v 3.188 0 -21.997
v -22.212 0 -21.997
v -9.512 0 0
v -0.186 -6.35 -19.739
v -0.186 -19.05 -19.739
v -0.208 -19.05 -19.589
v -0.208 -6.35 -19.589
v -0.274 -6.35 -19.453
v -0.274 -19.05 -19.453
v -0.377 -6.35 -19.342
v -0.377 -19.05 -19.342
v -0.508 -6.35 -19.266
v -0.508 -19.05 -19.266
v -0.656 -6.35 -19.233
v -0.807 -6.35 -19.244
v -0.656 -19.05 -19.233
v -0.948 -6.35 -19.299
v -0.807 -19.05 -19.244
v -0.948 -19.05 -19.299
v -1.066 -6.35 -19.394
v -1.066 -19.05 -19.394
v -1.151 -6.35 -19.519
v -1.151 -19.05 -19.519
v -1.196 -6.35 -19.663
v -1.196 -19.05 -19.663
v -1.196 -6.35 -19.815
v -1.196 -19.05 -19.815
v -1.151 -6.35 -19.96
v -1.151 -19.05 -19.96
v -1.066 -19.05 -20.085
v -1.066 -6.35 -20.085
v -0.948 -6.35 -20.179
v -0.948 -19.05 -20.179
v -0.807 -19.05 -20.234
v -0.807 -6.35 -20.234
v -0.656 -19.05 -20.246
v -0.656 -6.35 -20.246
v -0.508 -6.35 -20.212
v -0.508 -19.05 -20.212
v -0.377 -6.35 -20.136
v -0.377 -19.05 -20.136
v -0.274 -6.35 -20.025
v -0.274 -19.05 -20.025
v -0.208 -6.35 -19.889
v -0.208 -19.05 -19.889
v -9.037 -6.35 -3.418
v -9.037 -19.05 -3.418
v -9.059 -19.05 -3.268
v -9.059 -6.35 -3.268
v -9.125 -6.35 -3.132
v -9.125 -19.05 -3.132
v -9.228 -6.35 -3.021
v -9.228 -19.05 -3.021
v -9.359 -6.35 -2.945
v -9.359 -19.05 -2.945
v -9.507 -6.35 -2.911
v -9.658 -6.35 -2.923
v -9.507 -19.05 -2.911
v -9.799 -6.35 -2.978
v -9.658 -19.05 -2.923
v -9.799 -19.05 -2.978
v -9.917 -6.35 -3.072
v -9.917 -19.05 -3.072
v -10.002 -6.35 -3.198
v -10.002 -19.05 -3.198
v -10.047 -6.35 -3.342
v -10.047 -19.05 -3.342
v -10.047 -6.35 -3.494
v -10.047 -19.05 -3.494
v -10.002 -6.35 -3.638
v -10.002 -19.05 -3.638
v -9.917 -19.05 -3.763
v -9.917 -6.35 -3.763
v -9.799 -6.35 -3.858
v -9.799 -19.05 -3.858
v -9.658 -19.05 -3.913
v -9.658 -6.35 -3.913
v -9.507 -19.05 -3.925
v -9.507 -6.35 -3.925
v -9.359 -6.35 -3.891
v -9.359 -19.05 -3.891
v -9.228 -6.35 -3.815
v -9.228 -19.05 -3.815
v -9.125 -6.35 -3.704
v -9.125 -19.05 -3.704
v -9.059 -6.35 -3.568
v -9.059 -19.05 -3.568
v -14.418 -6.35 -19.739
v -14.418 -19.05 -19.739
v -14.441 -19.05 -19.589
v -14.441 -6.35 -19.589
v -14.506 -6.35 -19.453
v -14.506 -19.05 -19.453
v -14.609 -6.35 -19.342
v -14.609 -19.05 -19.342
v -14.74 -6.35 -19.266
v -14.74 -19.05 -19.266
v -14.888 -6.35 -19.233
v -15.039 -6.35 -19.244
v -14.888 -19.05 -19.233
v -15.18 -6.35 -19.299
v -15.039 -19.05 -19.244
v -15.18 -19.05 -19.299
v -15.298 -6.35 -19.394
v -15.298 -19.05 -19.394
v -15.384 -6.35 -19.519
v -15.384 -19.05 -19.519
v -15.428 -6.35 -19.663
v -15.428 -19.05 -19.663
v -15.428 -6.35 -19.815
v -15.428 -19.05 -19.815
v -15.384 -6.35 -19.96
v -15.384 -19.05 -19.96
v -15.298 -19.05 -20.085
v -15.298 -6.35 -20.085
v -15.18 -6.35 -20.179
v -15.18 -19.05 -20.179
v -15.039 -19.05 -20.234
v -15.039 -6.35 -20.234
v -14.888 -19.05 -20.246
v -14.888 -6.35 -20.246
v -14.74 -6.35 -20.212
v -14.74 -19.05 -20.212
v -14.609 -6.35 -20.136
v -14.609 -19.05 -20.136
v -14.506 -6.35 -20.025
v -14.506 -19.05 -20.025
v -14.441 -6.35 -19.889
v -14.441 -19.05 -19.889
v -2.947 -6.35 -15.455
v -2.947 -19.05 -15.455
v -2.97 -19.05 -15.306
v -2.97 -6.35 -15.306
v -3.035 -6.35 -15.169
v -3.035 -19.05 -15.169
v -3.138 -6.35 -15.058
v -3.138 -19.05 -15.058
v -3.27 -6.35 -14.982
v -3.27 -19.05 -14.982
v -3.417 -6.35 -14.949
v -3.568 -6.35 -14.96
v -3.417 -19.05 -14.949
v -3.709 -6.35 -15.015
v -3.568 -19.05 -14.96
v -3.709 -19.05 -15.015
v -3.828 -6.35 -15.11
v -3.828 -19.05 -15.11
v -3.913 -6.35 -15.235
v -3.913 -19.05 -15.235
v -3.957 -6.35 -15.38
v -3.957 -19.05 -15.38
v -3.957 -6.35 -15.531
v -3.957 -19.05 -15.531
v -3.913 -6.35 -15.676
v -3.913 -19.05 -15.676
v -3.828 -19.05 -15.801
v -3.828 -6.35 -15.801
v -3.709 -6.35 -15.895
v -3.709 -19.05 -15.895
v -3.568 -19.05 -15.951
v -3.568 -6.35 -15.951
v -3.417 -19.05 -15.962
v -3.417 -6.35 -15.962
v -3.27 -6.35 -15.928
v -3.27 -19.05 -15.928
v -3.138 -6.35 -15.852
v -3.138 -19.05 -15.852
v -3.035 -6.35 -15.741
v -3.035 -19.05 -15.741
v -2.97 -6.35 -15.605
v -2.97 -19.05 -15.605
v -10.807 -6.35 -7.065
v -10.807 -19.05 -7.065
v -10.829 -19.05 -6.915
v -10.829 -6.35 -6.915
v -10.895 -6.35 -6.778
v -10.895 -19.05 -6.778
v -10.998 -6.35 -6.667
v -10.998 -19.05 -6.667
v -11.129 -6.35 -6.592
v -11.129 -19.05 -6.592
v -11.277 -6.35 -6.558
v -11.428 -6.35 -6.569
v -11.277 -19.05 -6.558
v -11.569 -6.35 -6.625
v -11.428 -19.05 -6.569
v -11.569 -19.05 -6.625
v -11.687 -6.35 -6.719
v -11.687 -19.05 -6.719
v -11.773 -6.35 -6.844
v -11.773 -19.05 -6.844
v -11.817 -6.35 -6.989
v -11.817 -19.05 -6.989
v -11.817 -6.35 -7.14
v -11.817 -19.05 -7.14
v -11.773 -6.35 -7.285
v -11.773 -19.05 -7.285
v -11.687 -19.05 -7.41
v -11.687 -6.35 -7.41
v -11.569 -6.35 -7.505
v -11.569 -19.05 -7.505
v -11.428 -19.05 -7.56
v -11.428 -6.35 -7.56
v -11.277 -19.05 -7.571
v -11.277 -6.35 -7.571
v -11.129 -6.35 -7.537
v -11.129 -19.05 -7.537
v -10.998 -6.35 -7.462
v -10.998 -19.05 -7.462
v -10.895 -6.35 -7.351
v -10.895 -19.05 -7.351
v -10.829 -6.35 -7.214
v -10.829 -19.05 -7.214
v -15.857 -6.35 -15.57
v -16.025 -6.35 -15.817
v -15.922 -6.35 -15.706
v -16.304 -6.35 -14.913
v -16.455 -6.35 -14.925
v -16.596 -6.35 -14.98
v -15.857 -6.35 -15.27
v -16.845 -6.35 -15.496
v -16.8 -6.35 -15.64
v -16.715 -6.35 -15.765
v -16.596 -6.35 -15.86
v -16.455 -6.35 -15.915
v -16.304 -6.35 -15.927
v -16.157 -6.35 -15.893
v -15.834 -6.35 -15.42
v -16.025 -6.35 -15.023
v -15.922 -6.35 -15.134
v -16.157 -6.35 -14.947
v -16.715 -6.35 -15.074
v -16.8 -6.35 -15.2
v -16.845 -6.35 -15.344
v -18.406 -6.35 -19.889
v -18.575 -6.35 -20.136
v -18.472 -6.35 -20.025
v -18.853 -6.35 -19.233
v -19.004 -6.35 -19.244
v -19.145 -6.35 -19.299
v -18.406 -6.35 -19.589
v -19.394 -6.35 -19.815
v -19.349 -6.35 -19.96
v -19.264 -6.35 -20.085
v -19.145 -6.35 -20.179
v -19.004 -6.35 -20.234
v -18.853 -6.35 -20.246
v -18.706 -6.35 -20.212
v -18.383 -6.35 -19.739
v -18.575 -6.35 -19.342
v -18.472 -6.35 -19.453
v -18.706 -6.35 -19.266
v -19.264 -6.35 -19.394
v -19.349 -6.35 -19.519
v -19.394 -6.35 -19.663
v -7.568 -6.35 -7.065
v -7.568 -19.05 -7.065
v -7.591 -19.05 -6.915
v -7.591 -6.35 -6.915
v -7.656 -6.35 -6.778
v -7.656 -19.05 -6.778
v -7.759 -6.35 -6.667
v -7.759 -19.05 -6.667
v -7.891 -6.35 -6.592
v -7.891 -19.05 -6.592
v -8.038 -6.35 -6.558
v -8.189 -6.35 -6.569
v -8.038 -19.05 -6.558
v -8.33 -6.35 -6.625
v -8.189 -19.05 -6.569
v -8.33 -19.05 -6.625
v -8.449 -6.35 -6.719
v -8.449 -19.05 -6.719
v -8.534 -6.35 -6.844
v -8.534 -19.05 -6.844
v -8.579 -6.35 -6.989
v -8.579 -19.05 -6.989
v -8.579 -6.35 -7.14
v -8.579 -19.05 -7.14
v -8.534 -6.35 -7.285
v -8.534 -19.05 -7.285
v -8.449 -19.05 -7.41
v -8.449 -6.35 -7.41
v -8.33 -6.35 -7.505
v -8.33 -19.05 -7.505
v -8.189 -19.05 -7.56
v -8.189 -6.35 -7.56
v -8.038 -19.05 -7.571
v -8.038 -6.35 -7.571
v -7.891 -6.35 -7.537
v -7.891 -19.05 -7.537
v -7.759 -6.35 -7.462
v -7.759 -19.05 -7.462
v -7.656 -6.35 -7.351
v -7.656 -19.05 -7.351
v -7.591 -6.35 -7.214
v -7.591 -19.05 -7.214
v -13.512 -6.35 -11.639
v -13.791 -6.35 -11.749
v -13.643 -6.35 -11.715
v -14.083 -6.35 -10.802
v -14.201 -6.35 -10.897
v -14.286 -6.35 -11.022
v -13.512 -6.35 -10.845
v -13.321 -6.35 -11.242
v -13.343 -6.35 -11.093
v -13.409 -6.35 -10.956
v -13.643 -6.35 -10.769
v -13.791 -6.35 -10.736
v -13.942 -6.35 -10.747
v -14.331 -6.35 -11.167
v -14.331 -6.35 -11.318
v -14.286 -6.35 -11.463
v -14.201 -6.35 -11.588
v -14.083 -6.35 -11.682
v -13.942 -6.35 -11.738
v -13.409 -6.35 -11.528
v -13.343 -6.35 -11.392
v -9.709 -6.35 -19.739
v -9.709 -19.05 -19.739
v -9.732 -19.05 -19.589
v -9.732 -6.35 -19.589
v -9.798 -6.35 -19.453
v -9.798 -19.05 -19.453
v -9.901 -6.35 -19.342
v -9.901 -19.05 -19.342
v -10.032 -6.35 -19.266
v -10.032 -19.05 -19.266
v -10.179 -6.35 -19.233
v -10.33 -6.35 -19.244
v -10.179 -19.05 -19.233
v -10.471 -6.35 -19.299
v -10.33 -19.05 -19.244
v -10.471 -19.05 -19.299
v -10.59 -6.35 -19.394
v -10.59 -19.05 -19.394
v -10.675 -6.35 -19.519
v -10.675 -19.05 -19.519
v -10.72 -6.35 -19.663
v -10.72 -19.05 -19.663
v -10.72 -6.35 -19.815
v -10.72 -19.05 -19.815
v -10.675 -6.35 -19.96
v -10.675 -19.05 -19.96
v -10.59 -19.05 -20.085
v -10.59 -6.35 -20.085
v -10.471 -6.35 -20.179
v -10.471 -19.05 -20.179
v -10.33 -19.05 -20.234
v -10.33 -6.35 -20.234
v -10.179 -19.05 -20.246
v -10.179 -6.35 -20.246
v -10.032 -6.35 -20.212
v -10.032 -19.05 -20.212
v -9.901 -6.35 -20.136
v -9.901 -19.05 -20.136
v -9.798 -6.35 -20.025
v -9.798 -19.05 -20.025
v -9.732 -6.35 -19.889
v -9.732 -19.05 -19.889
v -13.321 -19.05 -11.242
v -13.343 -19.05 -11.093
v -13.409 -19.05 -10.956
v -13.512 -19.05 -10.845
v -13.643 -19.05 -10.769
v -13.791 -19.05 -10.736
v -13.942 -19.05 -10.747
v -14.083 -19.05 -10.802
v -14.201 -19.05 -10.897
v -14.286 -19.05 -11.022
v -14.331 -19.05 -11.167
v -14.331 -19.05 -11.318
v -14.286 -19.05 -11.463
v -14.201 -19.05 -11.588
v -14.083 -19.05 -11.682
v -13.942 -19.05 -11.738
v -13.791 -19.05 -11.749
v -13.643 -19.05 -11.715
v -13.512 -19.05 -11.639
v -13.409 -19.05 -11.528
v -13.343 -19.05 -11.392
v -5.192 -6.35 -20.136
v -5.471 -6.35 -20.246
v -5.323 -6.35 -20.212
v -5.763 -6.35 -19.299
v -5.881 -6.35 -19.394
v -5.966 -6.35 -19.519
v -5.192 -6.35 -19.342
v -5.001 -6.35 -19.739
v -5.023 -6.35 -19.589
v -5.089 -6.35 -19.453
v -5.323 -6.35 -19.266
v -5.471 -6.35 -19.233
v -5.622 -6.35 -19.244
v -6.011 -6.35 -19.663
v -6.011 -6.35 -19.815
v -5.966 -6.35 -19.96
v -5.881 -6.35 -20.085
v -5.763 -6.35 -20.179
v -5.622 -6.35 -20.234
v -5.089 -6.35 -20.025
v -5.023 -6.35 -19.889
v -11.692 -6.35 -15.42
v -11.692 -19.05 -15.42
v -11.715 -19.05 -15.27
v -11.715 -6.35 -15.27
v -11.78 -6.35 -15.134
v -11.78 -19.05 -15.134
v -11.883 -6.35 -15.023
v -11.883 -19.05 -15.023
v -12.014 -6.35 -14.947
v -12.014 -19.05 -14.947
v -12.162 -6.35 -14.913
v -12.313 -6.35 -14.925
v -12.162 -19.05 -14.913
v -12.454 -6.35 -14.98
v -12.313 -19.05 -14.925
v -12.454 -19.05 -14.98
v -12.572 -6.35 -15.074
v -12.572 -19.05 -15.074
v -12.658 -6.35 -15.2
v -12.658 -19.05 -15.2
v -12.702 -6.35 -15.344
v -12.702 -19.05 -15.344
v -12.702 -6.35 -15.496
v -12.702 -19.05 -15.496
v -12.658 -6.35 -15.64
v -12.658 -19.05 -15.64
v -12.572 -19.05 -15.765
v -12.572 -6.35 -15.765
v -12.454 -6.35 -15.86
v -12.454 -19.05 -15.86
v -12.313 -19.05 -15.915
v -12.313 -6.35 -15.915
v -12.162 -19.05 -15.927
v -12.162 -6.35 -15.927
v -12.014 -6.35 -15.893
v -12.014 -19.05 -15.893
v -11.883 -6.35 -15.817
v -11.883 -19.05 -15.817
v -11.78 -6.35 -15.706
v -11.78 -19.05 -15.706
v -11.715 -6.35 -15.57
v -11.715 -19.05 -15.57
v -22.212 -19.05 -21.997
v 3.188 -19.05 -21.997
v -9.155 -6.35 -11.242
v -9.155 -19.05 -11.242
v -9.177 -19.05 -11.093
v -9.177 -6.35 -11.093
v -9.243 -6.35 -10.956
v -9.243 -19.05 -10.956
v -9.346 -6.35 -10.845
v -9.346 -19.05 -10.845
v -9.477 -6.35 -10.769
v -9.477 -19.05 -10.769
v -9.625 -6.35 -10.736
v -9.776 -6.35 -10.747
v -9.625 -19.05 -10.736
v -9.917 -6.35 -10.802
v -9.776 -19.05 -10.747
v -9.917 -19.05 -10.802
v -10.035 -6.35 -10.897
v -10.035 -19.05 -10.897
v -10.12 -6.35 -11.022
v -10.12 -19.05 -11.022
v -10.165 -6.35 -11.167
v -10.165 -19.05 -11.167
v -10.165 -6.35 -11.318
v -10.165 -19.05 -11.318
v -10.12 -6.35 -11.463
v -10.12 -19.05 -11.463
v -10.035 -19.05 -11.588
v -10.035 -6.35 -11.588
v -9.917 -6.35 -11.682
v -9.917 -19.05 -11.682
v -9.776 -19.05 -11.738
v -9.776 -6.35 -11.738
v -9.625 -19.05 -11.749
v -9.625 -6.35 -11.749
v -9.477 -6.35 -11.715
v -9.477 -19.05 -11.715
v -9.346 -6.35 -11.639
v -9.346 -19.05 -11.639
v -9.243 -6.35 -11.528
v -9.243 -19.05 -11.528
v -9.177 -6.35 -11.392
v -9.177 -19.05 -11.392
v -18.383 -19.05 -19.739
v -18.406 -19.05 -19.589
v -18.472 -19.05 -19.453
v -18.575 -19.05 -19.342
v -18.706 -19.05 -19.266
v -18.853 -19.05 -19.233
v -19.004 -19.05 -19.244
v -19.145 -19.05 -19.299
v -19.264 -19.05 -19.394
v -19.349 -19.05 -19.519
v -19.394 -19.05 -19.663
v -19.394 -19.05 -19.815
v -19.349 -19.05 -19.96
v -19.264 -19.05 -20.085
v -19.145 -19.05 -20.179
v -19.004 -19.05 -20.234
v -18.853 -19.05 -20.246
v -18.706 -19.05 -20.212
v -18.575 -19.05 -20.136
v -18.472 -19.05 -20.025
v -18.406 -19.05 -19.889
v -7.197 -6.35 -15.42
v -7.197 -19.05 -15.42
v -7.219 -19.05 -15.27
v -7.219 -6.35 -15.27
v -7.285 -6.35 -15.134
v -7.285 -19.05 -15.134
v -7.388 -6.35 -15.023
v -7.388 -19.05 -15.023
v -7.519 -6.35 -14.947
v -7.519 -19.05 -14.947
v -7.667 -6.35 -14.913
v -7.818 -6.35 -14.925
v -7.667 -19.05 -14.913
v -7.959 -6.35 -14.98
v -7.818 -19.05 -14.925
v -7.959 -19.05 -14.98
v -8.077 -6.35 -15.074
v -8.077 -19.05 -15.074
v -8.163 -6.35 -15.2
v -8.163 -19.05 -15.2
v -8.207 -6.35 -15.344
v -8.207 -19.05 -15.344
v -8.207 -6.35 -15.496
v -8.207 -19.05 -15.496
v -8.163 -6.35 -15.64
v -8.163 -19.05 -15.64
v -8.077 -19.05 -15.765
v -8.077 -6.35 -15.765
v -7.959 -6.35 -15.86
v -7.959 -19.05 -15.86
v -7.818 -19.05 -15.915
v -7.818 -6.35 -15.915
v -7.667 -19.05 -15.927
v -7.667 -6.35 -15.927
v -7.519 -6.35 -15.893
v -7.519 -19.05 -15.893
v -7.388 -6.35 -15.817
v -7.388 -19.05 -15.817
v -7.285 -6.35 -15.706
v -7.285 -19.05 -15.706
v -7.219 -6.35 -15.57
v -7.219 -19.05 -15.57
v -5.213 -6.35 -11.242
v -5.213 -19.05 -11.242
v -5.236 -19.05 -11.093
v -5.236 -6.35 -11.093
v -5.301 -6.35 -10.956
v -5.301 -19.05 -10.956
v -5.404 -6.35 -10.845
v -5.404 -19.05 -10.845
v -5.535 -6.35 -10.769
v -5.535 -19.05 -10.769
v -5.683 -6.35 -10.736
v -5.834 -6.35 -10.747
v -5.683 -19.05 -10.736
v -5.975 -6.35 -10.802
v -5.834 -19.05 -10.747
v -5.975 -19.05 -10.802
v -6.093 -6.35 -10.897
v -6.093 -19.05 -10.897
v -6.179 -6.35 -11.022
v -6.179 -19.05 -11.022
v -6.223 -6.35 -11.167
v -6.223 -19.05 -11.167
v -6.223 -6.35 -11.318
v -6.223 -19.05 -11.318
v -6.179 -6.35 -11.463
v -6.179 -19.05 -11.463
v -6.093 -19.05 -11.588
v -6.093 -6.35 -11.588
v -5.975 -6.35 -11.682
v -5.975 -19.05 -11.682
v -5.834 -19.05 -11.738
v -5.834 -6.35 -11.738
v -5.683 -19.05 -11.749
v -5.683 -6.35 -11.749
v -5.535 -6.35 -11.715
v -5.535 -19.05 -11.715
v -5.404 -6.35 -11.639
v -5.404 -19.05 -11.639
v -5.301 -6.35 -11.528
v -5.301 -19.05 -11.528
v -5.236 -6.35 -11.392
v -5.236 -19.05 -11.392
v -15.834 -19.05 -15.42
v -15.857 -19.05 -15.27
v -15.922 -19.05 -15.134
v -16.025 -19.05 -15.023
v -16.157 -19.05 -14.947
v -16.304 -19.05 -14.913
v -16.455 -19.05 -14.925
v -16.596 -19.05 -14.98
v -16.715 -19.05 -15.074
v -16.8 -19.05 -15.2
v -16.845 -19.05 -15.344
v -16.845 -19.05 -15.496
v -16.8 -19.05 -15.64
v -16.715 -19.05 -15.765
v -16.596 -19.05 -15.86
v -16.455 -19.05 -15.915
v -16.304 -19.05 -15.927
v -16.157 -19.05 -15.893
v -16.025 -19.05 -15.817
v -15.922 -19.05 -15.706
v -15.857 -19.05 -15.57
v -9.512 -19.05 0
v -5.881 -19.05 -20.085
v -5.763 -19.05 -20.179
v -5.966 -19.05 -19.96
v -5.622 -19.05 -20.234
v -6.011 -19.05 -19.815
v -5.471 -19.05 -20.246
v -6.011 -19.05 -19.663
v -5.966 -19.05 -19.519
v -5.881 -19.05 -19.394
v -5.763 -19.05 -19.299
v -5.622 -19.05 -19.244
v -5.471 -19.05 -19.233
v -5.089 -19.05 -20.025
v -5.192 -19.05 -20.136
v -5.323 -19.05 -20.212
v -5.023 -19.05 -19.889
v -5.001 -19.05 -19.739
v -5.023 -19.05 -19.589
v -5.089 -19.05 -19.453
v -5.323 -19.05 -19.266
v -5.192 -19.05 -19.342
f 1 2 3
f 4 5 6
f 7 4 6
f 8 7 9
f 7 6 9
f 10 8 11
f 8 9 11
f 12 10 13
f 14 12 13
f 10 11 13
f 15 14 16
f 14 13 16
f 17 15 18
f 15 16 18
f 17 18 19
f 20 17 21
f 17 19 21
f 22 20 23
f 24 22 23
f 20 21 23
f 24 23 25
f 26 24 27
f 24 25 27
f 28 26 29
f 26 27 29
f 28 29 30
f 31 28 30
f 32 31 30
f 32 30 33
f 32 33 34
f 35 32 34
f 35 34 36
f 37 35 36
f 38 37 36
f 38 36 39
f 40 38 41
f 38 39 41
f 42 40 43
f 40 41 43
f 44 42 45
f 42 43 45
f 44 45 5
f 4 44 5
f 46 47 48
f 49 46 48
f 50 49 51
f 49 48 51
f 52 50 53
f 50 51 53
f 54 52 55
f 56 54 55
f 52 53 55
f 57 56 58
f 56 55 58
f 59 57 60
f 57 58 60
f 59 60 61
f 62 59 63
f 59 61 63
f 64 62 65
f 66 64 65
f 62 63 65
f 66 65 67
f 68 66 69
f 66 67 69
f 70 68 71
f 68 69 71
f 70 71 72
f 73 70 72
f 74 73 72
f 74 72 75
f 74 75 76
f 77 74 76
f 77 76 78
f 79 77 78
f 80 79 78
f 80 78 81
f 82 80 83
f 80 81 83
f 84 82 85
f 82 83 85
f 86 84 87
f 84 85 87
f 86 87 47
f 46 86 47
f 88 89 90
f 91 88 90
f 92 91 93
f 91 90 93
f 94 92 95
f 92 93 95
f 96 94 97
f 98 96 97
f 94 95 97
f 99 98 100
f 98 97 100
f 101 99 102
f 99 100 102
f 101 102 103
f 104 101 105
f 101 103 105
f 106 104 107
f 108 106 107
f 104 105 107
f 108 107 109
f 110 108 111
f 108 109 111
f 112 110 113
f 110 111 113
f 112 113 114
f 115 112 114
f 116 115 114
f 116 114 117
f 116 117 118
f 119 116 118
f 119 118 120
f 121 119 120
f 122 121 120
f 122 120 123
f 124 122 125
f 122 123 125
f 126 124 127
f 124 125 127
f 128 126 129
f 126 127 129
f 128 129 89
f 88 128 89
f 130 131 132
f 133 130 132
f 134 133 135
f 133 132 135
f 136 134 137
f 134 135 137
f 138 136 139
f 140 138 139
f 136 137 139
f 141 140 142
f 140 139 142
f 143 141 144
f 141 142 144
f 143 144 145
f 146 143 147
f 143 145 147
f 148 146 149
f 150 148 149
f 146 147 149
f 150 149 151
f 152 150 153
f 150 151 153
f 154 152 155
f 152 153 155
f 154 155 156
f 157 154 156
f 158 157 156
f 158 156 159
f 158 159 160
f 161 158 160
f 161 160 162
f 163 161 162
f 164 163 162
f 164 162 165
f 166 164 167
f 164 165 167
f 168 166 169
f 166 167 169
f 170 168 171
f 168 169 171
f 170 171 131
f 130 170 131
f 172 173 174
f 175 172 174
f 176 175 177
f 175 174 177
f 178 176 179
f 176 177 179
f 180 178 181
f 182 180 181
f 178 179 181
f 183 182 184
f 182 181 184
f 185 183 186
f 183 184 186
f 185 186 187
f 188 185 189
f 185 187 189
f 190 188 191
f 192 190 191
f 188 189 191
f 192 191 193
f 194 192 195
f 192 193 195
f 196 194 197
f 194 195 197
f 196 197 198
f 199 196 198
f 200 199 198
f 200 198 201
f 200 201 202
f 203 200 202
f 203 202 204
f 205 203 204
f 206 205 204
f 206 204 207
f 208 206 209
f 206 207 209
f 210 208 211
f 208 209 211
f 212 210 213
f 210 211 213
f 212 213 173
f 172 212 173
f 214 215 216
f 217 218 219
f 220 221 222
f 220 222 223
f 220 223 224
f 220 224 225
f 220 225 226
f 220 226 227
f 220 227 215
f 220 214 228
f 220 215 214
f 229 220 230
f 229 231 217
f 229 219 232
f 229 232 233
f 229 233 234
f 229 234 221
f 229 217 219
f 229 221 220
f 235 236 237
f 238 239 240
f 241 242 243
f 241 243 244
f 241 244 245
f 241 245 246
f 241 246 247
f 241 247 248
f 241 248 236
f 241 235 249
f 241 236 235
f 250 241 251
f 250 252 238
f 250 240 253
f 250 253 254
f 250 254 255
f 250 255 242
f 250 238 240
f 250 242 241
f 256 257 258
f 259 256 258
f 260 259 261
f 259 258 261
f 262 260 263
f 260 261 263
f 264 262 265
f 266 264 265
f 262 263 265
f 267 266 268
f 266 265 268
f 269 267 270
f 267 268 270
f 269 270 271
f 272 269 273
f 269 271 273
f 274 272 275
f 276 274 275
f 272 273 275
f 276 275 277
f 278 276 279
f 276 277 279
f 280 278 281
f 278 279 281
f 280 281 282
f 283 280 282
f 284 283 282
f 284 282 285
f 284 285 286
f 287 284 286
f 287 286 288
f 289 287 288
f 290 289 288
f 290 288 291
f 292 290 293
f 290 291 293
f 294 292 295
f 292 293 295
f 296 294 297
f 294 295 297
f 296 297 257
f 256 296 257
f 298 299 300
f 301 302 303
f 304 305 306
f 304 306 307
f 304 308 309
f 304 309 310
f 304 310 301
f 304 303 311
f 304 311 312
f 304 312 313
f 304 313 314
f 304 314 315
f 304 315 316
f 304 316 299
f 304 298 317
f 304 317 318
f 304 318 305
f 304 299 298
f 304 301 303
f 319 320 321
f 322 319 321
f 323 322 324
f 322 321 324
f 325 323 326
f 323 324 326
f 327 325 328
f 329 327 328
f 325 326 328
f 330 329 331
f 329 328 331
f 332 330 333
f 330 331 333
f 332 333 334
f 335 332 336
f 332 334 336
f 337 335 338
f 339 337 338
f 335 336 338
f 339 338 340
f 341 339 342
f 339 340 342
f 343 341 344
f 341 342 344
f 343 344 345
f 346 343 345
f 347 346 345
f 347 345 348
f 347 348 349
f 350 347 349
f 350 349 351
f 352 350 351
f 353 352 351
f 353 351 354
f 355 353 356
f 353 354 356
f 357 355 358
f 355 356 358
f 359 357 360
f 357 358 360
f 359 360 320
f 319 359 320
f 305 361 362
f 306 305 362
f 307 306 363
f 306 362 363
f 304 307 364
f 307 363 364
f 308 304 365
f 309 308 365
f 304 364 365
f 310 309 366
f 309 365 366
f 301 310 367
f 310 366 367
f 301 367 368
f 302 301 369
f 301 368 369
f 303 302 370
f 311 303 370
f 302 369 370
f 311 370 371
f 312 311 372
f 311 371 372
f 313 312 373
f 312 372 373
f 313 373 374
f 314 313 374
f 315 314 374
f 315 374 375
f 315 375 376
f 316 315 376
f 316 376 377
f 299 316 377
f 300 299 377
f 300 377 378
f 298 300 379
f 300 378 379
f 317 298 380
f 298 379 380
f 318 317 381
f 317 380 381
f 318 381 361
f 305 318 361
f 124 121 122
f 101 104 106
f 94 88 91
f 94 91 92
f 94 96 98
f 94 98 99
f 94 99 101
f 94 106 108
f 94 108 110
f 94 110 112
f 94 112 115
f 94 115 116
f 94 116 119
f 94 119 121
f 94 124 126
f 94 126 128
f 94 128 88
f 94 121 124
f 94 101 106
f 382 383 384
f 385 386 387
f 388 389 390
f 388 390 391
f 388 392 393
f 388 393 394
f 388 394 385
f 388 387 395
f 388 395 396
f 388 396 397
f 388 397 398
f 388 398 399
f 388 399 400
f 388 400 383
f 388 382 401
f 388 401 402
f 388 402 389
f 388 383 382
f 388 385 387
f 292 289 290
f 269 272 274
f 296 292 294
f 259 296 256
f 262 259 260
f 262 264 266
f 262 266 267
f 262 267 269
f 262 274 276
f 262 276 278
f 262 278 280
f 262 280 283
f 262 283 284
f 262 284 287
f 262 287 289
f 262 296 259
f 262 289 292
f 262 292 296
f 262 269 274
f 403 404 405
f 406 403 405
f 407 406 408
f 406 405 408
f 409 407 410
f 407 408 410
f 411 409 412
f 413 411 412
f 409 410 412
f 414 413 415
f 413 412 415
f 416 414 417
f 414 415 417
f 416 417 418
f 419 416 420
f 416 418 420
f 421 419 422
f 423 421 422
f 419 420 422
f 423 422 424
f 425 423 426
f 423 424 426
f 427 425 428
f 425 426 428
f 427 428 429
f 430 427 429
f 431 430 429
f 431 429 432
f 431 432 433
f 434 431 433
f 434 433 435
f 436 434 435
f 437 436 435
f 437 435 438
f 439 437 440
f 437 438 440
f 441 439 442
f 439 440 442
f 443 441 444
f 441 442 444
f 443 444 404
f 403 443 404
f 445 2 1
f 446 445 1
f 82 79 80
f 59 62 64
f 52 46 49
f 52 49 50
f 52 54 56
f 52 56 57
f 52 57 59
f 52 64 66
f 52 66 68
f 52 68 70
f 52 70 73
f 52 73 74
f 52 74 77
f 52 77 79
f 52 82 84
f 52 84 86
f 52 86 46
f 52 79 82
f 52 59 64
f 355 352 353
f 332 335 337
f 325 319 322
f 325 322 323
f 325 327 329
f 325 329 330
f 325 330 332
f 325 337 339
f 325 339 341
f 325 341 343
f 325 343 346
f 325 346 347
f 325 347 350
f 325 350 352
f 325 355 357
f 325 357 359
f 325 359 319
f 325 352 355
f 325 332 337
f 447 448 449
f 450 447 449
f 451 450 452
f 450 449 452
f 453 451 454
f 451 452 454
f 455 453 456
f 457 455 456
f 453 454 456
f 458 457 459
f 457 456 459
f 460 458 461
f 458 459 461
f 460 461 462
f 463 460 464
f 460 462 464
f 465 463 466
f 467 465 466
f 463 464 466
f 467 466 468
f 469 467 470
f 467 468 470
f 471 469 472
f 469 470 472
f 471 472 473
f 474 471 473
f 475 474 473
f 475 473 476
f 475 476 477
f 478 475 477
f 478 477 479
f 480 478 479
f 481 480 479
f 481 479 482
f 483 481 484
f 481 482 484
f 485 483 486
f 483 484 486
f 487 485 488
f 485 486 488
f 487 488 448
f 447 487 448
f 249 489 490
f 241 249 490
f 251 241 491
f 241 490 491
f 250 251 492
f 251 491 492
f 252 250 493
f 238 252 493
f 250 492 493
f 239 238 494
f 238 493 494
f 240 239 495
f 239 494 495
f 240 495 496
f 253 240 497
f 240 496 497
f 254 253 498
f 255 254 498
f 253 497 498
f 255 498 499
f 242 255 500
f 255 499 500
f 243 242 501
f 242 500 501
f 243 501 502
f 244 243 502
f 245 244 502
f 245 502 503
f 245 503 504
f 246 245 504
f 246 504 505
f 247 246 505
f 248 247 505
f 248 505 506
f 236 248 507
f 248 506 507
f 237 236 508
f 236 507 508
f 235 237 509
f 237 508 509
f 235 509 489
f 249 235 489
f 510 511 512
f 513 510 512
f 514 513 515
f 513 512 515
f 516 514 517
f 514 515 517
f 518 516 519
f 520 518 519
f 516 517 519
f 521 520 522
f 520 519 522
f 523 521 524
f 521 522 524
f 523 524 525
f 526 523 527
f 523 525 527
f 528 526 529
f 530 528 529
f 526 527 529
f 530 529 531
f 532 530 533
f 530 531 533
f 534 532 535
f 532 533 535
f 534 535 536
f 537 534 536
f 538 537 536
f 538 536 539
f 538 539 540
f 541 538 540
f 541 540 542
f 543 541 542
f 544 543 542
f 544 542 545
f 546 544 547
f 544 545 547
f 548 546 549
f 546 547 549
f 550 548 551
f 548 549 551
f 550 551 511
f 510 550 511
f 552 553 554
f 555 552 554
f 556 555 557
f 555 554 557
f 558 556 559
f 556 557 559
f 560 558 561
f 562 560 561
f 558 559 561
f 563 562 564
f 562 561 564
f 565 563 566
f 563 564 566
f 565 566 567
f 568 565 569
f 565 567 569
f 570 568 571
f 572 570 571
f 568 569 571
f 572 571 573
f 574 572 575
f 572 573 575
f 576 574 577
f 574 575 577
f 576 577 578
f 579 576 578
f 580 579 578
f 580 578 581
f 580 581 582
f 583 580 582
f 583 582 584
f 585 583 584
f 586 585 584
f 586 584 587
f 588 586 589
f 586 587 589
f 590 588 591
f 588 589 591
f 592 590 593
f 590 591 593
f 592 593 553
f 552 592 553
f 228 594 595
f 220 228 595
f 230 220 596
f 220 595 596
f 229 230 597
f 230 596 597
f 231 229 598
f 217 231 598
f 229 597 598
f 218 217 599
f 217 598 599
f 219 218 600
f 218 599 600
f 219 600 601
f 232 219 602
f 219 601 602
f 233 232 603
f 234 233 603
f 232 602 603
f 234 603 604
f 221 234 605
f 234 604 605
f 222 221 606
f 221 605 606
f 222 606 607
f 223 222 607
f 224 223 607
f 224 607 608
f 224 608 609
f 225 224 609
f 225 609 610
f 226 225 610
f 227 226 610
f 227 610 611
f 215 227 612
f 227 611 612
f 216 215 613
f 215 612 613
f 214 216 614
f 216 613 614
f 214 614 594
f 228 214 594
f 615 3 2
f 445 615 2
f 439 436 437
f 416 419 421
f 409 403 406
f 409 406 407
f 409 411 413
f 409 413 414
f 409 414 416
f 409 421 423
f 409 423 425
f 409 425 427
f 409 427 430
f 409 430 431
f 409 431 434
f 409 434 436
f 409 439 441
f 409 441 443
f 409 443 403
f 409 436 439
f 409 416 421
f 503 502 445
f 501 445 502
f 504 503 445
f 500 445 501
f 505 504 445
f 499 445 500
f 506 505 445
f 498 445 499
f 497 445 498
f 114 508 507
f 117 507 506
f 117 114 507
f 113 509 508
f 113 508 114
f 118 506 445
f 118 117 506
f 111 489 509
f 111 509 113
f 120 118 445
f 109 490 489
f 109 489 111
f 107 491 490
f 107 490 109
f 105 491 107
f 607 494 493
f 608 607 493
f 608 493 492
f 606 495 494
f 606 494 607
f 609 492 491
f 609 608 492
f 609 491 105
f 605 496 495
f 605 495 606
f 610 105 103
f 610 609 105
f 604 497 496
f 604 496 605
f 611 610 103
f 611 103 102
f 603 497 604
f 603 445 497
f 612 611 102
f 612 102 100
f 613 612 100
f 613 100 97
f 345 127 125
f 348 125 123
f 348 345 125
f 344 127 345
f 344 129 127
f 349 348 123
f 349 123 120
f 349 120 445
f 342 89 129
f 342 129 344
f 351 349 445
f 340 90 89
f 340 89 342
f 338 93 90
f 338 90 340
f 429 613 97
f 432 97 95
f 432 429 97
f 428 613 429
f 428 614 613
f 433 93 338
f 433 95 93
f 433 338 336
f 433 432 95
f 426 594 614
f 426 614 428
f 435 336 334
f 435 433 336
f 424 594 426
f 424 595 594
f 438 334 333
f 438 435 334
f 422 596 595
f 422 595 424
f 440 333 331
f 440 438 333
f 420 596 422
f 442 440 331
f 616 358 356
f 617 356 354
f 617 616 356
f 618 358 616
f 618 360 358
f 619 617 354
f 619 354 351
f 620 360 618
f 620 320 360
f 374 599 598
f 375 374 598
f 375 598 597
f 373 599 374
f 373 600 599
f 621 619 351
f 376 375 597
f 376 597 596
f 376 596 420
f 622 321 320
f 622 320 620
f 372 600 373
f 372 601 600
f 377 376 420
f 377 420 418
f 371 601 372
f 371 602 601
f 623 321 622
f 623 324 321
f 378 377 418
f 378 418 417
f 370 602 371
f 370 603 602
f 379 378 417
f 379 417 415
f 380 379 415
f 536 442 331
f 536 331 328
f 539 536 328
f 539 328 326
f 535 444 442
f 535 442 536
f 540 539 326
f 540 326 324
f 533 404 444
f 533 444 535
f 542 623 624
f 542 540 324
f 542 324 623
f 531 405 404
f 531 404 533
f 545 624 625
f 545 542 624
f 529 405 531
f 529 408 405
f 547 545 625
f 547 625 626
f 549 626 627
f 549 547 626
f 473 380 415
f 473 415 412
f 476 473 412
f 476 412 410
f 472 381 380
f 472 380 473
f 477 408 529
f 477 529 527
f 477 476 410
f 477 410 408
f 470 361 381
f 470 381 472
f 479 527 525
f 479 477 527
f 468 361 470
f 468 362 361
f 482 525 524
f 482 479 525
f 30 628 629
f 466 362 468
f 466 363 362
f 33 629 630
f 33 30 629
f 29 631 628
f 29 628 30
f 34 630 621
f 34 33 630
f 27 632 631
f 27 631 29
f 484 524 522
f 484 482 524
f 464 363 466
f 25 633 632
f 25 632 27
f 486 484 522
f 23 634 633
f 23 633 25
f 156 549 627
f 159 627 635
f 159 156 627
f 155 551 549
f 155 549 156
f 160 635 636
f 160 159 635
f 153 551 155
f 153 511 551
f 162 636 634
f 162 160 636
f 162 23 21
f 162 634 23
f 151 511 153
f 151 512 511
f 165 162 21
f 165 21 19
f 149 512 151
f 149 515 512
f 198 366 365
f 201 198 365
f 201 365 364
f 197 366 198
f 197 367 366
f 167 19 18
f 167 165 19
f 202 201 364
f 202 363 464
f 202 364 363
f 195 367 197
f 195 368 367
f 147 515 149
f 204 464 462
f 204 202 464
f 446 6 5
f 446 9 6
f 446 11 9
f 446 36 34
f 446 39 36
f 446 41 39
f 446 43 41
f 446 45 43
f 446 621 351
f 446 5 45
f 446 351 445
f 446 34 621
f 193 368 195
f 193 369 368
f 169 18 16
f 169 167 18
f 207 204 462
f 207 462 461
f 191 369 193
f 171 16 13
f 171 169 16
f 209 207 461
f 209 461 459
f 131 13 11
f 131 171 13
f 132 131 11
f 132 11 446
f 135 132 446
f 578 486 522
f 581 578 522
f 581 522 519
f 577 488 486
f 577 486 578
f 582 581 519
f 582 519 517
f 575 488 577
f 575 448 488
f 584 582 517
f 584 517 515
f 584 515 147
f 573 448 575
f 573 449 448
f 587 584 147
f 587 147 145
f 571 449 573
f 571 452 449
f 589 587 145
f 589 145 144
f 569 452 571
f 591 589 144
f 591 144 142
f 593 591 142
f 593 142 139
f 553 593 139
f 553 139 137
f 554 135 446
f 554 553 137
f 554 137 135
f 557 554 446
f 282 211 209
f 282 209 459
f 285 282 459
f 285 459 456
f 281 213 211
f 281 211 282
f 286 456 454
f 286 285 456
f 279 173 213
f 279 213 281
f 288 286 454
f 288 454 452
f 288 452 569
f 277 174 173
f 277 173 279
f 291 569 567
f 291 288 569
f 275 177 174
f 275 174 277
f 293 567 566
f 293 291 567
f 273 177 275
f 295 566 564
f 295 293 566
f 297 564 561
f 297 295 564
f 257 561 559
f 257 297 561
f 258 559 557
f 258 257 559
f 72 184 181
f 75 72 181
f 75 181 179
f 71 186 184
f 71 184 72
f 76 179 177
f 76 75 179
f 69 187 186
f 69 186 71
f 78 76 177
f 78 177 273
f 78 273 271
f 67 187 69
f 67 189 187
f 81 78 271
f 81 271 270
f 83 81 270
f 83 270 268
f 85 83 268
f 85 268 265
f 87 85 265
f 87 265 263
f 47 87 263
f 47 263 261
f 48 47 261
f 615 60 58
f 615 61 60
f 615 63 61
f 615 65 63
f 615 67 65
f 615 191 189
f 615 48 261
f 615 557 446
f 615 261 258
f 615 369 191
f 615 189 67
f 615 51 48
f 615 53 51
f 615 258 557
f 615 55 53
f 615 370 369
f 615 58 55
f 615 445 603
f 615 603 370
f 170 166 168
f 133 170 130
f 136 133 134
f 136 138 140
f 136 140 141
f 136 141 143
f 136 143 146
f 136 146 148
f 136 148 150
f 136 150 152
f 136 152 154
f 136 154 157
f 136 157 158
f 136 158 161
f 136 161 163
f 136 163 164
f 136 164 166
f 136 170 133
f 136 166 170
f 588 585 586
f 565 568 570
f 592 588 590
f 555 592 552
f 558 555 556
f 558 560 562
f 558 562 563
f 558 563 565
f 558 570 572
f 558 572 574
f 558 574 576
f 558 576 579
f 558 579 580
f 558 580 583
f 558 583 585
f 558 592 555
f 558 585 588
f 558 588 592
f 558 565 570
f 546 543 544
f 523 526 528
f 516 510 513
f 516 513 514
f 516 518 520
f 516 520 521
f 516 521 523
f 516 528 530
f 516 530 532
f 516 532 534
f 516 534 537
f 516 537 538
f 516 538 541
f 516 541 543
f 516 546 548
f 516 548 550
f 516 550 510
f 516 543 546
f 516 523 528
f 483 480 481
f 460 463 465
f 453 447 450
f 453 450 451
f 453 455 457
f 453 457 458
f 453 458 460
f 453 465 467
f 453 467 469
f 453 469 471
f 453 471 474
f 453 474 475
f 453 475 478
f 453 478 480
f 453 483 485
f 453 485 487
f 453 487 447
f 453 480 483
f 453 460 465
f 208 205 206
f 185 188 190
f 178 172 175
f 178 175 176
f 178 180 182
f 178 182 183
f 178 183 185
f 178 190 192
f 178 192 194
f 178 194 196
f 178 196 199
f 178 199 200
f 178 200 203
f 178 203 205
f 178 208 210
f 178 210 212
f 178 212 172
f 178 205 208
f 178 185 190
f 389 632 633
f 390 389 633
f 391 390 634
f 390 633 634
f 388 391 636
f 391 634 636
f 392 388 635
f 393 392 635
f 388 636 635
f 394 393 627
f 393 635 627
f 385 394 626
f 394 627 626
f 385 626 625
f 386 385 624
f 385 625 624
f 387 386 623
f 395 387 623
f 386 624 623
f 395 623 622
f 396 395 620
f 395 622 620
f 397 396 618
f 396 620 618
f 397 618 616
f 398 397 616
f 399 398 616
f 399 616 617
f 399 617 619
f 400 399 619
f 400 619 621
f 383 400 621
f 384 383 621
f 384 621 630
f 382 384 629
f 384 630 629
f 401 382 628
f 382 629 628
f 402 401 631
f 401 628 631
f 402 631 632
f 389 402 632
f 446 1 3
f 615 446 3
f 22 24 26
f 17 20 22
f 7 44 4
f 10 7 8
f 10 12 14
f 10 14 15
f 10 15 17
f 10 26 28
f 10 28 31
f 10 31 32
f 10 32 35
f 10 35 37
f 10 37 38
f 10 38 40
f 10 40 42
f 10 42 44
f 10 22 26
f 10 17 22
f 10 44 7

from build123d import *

# Parameters (mm, degrees)
F1_DEPTH = 19.05
F2_R     = 0.508
F3_DEPTH = 12.7


with BuildPart() as f1:
    # F0 (on Front) → F1 (new body)
    with BuildSketch(Plane.XZ):
        Polygon((-9.511831, 0), (-22.211831, -21.997045), (3.188169, -21.997045), align=None)
    extrude(amount=F1_DEPTH)

    # F2 (on face) → F3 (cut)
    with BuildSketch(Plane.XZ.offset(19.05)):
        with Locations((-18.891316, -19.739211)):
            Circle(F2_R)
        with Locations((-14.926066, -19.739211)):
            Circle(F2_R)
        with Locations((-5.508598, -19.739211)):
            Circle(F2_R)
        with Locations((-0.693653, -19.739211)):
            Circle(F2_R)
        with Locations((-10.217332, -19.739211)):
            Circle(F2_R)
        with Locations((-12.199957, -15.419921)):
            Circle(F2_R)
        with Locations((-7.704876, -15.419921)):
            Circle(F2_R)
        with Locations((-3.455166, -15.455325)):
            Circle(F2_R)
        with Locations((-8.076196, -7.064574)):
            Circle(F2_R)
        with Locations((-13.828542, -11.242247)):
            Circle(F2_R)
        with Locations((-5.721022, -11.242247)):
            Circle(F2_R)
        with Locations((-9.544656, -3.417961)):
            Circle(F2_R)
        with Locations((-11.314857, -7.064574)):
            Circle(F2_R)
        with Locations((-9.662744, -11.242247)):
            Circle(F2_R)
        with Locations((-16.342226, -15.419921)):
            Circle(F2_R)
    extrude(amount=-F3_DEPTH, mode=Mode.SUBTRACT)


solid = f1.part
